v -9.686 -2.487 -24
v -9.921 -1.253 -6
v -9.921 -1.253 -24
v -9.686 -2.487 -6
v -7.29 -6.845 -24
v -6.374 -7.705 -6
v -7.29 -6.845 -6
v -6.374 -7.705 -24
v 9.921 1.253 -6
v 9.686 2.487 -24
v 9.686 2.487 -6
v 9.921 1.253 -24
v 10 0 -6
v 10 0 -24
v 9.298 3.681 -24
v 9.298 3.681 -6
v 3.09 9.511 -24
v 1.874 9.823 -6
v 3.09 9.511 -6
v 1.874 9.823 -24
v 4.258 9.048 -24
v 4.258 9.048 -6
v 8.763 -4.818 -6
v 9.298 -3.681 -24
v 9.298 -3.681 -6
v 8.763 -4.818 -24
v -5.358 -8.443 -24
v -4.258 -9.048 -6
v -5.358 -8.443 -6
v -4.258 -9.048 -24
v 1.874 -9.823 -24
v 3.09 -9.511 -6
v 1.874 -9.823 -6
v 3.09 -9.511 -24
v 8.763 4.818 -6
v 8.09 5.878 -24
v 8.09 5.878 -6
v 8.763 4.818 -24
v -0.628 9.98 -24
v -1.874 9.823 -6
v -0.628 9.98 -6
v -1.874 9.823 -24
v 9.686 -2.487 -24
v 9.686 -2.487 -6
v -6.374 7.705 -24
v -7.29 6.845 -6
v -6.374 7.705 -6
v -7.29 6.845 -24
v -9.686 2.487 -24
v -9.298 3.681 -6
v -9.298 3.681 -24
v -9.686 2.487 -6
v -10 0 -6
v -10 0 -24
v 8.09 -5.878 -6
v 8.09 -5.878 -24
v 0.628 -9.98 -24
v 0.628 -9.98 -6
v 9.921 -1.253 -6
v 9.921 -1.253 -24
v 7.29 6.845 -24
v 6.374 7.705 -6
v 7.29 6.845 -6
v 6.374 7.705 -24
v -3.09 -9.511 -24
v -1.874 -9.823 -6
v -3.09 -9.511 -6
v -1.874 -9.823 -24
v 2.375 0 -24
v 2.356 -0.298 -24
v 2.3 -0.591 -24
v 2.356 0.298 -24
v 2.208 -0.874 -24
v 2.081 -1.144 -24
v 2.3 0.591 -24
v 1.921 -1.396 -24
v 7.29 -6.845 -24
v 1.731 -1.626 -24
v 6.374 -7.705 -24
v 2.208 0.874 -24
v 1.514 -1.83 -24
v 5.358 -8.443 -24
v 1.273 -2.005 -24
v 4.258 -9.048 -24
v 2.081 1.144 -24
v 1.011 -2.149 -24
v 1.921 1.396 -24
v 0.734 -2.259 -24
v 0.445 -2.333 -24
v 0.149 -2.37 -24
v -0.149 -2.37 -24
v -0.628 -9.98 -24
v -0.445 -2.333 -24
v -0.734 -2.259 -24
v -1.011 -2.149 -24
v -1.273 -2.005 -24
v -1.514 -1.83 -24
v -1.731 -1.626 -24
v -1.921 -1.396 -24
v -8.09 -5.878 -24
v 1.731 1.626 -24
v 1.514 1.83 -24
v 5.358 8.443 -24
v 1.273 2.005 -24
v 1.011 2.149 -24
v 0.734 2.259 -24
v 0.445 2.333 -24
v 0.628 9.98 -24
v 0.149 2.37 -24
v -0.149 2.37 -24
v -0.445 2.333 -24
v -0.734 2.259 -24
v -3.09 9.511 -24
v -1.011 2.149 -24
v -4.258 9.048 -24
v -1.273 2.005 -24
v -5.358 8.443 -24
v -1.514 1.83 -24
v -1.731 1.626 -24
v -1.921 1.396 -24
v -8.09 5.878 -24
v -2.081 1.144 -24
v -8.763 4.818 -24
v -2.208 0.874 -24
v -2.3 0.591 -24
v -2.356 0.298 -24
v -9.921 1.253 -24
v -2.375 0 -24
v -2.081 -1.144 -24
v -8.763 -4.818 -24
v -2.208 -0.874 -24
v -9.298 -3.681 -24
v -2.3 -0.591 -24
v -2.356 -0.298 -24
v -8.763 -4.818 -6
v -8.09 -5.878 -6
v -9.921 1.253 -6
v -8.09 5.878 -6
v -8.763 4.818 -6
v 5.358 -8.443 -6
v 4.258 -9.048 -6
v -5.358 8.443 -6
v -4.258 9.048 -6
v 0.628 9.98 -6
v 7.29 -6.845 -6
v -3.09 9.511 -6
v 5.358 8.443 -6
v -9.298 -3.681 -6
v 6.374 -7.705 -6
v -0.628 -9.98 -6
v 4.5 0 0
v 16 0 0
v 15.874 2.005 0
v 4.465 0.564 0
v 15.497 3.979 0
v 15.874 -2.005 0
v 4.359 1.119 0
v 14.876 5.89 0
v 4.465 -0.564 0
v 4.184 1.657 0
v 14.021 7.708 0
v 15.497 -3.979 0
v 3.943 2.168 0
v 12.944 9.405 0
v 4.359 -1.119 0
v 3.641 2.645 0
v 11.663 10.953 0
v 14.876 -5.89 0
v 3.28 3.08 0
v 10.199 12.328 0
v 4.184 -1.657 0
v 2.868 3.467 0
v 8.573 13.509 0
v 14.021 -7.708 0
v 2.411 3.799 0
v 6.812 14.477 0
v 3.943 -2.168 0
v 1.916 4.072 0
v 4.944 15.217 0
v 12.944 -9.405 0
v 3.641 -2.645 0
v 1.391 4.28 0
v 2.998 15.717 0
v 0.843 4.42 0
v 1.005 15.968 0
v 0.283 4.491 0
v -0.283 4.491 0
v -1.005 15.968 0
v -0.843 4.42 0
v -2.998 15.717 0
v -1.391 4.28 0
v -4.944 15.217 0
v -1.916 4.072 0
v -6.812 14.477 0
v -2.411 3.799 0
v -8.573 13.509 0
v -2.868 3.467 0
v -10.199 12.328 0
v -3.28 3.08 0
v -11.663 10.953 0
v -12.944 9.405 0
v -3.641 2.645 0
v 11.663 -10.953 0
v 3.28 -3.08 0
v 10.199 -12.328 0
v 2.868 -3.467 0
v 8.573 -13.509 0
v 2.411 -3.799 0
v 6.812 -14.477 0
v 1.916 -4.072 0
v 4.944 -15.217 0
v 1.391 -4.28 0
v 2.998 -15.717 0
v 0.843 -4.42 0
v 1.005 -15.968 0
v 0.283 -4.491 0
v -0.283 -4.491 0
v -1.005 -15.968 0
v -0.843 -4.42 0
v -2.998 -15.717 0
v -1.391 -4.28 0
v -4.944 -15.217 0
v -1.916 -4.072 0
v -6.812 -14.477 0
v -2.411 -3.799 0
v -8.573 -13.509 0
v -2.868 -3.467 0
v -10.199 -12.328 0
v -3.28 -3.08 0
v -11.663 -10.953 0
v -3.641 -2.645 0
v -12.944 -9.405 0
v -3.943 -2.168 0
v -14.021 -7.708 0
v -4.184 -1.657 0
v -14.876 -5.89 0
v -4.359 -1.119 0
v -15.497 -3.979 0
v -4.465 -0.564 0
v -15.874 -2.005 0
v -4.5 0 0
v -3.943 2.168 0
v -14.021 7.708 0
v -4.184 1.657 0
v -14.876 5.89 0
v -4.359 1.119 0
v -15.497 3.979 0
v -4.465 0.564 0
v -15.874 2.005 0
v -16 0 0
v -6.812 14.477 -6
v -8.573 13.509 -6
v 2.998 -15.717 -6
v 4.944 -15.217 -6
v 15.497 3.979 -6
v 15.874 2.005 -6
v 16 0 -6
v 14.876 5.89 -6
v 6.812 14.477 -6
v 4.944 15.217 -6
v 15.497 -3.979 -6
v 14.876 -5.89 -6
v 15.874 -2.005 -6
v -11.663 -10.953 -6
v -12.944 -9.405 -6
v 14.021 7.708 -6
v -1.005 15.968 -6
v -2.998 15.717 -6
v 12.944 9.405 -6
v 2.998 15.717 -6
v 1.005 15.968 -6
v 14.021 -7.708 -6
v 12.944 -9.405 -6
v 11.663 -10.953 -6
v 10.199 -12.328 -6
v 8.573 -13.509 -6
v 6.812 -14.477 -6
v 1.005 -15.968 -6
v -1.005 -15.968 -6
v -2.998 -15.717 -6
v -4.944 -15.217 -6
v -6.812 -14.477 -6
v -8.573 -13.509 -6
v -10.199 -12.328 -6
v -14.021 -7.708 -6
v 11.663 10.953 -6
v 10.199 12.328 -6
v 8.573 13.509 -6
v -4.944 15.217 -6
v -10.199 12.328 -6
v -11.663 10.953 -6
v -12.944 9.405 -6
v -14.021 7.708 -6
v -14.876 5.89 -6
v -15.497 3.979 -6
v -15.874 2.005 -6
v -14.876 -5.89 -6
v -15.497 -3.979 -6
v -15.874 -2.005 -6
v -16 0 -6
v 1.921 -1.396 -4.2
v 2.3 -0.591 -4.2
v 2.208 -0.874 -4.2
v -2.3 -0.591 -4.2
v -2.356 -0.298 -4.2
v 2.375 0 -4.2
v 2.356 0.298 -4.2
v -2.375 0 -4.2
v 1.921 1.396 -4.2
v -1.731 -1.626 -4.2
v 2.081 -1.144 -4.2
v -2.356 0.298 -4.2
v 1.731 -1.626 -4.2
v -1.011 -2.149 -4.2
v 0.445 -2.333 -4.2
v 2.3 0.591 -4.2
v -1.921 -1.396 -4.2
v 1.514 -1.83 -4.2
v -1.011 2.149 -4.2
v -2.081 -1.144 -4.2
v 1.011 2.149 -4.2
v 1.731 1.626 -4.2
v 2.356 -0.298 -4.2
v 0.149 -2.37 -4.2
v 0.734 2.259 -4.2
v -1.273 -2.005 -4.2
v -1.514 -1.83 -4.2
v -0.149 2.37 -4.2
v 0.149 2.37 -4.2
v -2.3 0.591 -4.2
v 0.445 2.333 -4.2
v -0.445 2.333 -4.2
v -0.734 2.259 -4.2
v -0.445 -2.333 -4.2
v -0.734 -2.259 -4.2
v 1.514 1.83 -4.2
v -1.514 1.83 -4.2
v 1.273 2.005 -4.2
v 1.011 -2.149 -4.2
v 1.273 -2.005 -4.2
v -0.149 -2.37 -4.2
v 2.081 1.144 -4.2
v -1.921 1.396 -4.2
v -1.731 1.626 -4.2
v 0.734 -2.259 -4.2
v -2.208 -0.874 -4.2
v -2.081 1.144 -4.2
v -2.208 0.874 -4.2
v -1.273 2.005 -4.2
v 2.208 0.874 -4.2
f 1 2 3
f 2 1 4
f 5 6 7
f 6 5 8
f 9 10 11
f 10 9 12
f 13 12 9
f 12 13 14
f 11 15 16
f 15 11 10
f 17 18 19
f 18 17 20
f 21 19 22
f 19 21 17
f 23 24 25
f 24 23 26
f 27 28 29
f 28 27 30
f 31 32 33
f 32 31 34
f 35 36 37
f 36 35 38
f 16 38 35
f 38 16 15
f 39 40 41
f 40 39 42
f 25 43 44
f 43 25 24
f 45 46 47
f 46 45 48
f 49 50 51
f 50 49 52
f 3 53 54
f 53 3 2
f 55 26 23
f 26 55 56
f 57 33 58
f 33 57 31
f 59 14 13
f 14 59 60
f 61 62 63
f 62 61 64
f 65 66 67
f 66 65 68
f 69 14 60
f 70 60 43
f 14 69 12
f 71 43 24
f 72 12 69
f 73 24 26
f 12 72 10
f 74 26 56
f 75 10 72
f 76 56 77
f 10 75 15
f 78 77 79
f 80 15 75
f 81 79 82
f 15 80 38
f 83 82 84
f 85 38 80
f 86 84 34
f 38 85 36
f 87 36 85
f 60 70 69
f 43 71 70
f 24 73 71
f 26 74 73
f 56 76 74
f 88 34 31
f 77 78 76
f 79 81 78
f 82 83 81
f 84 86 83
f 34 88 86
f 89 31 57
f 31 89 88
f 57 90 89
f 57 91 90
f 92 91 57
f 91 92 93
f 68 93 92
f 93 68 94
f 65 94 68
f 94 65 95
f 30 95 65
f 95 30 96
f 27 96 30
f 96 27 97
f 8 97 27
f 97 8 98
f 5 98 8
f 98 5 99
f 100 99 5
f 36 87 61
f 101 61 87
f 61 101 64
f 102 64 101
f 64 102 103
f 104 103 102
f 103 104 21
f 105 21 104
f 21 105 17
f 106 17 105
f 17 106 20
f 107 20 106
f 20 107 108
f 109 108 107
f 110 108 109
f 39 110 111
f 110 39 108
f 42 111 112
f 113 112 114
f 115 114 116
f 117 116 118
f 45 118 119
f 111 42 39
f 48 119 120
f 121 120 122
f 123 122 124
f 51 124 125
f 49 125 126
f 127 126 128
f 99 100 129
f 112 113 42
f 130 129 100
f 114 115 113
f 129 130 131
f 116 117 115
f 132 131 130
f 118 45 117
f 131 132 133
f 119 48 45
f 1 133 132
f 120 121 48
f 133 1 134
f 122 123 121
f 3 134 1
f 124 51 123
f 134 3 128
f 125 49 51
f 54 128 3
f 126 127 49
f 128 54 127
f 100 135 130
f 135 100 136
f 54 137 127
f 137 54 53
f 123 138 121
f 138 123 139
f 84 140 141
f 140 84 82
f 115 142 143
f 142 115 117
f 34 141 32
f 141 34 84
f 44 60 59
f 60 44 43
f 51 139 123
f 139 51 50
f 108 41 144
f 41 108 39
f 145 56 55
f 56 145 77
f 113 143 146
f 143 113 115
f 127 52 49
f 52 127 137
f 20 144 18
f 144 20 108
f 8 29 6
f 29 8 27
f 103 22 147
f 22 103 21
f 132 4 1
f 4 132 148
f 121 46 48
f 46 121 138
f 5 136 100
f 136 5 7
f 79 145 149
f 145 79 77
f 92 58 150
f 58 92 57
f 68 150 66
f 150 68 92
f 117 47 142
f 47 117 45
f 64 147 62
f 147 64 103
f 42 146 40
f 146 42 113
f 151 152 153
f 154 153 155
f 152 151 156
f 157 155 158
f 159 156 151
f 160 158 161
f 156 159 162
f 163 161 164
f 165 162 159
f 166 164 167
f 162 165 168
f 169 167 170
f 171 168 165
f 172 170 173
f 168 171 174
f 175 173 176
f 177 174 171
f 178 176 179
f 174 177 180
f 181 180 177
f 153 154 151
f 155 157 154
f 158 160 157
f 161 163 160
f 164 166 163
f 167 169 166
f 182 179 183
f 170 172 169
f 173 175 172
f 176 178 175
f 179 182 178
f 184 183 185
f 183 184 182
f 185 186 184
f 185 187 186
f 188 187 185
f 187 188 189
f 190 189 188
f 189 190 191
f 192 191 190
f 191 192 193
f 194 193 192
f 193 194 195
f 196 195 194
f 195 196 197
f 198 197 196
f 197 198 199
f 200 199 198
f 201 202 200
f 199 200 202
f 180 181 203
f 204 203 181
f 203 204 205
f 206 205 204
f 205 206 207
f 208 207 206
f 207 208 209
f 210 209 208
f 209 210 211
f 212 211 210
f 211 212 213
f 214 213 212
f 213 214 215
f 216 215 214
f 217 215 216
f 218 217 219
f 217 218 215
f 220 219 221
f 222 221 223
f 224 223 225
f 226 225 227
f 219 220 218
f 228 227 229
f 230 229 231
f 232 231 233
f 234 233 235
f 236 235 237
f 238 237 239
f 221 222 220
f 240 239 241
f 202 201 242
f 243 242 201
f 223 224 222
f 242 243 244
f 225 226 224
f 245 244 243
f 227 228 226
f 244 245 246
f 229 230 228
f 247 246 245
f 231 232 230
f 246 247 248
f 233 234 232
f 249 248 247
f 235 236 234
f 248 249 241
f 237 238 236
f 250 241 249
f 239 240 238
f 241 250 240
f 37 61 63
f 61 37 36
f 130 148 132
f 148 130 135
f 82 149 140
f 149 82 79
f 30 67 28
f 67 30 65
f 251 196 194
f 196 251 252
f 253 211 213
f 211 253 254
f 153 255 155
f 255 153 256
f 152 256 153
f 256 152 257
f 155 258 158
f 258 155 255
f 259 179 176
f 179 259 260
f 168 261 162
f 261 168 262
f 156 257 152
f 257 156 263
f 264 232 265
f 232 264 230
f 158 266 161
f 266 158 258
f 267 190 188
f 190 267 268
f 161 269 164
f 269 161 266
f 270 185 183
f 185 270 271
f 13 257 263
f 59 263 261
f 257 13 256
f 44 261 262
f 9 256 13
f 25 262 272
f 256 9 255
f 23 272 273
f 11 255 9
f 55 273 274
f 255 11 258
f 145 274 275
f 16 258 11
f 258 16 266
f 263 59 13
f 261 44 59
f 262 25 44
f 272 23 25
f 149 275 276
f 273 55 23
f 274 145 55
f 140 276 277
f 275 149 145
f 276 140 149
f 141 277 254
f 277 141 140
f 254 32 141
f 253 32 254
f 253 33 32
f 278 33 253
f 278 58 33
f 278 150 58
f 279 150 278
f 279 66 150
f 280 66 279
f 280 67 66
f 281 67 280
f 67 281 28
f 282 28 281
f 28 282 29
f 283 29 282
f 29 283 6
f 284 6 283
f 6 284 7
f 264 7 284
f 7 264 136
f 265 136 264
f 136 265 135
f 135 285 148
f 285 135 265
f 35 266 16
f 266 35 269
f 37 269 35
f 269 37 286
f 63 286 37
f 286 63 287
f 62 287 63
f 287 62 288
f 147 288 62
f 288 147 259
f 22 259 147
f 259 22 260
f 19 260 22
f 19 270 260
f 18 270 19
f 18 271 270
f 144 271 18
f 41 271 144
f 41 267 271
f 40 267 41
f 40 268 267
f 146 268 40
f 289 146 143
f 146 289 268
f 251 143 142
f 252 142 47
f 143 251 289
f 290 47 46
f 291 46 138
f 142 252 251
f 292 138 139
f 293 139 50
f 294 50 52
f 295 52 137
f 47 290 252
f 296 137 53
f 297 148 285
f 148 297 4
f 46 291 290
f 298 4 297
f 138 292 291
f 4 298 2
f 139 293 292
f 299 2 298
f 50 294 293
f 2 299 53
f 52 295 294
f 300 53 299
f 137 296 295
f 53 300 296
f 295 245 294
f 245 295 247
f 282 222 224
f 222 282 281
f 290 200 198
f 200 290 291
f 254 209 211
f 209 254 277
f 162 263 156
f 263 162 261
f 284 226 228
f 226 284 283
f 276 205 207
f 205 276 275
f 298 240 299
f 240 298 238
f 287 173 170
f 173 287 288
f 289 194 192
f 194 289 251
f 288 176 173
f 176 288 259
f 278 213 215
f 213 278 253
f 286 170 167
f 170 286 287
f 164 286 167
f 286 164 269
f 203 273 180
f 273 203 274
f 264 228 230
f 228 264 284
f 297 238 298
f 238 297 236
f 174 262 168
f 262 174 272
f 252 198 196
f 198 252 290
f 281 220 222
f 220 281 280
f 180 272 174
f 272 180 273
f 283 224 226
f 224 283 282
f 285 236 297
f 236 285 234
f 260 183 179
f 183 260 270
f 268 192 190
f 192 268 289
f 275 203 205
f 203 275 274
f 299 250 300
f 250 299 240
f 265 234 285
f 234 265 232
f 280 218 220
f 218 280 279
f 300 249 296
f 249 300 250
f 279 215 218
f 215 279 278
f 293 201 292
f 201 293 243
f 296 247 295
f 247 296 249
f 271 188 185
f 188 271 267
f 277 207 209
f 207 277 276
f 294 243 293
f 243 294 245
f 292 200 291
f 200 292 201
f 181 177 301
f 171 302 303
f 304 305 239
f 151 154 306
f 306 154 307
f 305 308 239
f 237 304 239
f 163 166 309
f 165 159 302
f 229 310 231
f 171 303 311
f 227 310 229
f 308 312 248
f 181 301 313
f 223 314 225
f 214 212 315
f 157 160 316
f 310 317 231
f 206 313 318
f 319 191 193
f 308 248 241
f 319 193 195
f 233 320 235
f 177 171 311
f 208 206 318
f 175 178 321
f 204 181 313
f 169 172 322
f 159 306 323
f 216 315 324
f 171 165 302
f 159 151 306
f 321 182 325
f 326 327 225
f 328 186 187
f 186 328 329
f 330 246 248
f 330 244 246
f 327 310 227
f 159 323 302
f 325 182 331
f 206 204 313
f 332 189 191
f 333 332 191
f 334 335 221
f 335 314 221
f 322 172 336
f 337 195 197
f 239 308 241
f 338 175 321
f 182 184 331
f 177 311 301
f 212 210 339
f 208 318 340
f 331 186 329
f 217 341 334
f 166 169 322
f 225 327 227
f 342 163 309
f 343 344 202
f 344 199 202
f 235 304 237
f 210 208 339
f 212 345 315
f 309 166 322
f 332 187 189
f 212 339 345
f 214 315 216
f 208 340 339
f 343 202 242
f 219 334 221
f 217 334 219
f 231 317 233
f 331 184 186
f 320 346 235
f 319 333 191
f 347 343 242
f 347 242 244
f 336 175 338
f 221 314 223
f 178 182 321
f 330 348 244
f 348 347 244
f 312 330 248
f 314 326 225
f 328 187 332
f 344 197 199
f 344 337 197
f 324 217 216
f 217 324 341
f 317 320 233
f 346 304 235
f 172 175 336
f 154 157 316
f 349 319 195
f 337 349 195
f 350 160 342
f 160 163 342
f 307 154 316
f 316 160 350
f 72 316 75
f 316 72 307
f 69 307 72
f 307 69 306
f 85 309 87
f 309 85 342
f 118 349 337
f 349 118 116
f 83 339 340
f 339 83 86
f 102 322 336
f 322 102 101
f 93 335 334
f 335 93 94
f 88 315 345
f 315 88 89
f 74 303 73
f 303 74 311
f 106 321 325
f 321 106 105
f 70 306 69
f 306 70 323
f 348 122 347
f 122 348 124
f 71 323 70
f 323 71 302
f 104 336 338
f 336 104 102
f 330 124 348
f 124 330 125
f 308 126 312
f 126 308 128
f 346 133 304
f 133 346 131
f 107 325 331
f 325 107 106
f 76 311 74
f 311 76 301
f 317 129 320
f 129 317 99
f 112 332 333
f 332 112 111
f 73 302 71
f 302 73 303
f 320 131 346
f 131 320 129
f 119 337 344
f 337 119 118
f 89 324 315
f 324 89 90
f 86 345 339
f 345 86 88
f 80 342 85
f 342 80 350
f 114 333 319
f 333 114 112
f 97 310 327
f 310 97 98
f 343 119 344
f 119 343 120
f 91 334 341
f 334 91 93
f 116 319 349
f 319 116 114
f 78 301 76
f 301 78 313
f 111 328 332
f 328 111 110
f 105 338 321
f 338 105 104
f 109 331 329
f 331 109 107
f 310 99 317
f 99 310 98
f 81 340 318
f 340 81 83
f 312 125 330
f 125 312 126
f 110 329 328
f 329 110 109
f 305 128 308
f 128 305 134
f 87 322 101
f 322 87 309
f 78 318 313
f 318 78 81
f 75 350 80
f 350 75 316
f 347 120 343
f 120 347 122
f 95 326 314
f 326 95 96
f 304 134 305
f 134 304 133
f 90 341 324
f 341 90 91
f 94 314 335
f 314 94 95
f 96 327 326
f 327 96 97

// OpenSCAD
$fn = 50;


difference() {
	union() {
		translate(v = [0, 0, -24.0000000000]) {
			cylinder(h = 24, r = 10.0000000000);
		}
		translate(v = [0, 0, -6.0000000000]) {
			cylinder(h = 6, r = 16.0000000000);
		}
	}
	union() {
		translate(v = [0, 0, 0]) {
			rotate(a = [0, 0, 0]) {
				difference() {
					union() {
						#translate(v = [0, 0, -24.0000000000]) {
							cylinder(h = 24, r = 2.2500000000);
						}
						#translate(v = [0, 0, -4.2000000000]) {
							cylinder(h = 4.2000000000, r = 10.0000000000, r1 = 2.3750000000, r2 = 4.5000000000);
						}
						#translate(v = [0, 0, -24.0000000000]) {
							cylinder(h = 24, r = 2.3750000000);
						}
						#translate(v = [0, 0, -24.0000000000]) {
							cylinder(h = 24, r = 2.2500000000);
						}
					}
					union();
				}
			}
		}
	}
}
